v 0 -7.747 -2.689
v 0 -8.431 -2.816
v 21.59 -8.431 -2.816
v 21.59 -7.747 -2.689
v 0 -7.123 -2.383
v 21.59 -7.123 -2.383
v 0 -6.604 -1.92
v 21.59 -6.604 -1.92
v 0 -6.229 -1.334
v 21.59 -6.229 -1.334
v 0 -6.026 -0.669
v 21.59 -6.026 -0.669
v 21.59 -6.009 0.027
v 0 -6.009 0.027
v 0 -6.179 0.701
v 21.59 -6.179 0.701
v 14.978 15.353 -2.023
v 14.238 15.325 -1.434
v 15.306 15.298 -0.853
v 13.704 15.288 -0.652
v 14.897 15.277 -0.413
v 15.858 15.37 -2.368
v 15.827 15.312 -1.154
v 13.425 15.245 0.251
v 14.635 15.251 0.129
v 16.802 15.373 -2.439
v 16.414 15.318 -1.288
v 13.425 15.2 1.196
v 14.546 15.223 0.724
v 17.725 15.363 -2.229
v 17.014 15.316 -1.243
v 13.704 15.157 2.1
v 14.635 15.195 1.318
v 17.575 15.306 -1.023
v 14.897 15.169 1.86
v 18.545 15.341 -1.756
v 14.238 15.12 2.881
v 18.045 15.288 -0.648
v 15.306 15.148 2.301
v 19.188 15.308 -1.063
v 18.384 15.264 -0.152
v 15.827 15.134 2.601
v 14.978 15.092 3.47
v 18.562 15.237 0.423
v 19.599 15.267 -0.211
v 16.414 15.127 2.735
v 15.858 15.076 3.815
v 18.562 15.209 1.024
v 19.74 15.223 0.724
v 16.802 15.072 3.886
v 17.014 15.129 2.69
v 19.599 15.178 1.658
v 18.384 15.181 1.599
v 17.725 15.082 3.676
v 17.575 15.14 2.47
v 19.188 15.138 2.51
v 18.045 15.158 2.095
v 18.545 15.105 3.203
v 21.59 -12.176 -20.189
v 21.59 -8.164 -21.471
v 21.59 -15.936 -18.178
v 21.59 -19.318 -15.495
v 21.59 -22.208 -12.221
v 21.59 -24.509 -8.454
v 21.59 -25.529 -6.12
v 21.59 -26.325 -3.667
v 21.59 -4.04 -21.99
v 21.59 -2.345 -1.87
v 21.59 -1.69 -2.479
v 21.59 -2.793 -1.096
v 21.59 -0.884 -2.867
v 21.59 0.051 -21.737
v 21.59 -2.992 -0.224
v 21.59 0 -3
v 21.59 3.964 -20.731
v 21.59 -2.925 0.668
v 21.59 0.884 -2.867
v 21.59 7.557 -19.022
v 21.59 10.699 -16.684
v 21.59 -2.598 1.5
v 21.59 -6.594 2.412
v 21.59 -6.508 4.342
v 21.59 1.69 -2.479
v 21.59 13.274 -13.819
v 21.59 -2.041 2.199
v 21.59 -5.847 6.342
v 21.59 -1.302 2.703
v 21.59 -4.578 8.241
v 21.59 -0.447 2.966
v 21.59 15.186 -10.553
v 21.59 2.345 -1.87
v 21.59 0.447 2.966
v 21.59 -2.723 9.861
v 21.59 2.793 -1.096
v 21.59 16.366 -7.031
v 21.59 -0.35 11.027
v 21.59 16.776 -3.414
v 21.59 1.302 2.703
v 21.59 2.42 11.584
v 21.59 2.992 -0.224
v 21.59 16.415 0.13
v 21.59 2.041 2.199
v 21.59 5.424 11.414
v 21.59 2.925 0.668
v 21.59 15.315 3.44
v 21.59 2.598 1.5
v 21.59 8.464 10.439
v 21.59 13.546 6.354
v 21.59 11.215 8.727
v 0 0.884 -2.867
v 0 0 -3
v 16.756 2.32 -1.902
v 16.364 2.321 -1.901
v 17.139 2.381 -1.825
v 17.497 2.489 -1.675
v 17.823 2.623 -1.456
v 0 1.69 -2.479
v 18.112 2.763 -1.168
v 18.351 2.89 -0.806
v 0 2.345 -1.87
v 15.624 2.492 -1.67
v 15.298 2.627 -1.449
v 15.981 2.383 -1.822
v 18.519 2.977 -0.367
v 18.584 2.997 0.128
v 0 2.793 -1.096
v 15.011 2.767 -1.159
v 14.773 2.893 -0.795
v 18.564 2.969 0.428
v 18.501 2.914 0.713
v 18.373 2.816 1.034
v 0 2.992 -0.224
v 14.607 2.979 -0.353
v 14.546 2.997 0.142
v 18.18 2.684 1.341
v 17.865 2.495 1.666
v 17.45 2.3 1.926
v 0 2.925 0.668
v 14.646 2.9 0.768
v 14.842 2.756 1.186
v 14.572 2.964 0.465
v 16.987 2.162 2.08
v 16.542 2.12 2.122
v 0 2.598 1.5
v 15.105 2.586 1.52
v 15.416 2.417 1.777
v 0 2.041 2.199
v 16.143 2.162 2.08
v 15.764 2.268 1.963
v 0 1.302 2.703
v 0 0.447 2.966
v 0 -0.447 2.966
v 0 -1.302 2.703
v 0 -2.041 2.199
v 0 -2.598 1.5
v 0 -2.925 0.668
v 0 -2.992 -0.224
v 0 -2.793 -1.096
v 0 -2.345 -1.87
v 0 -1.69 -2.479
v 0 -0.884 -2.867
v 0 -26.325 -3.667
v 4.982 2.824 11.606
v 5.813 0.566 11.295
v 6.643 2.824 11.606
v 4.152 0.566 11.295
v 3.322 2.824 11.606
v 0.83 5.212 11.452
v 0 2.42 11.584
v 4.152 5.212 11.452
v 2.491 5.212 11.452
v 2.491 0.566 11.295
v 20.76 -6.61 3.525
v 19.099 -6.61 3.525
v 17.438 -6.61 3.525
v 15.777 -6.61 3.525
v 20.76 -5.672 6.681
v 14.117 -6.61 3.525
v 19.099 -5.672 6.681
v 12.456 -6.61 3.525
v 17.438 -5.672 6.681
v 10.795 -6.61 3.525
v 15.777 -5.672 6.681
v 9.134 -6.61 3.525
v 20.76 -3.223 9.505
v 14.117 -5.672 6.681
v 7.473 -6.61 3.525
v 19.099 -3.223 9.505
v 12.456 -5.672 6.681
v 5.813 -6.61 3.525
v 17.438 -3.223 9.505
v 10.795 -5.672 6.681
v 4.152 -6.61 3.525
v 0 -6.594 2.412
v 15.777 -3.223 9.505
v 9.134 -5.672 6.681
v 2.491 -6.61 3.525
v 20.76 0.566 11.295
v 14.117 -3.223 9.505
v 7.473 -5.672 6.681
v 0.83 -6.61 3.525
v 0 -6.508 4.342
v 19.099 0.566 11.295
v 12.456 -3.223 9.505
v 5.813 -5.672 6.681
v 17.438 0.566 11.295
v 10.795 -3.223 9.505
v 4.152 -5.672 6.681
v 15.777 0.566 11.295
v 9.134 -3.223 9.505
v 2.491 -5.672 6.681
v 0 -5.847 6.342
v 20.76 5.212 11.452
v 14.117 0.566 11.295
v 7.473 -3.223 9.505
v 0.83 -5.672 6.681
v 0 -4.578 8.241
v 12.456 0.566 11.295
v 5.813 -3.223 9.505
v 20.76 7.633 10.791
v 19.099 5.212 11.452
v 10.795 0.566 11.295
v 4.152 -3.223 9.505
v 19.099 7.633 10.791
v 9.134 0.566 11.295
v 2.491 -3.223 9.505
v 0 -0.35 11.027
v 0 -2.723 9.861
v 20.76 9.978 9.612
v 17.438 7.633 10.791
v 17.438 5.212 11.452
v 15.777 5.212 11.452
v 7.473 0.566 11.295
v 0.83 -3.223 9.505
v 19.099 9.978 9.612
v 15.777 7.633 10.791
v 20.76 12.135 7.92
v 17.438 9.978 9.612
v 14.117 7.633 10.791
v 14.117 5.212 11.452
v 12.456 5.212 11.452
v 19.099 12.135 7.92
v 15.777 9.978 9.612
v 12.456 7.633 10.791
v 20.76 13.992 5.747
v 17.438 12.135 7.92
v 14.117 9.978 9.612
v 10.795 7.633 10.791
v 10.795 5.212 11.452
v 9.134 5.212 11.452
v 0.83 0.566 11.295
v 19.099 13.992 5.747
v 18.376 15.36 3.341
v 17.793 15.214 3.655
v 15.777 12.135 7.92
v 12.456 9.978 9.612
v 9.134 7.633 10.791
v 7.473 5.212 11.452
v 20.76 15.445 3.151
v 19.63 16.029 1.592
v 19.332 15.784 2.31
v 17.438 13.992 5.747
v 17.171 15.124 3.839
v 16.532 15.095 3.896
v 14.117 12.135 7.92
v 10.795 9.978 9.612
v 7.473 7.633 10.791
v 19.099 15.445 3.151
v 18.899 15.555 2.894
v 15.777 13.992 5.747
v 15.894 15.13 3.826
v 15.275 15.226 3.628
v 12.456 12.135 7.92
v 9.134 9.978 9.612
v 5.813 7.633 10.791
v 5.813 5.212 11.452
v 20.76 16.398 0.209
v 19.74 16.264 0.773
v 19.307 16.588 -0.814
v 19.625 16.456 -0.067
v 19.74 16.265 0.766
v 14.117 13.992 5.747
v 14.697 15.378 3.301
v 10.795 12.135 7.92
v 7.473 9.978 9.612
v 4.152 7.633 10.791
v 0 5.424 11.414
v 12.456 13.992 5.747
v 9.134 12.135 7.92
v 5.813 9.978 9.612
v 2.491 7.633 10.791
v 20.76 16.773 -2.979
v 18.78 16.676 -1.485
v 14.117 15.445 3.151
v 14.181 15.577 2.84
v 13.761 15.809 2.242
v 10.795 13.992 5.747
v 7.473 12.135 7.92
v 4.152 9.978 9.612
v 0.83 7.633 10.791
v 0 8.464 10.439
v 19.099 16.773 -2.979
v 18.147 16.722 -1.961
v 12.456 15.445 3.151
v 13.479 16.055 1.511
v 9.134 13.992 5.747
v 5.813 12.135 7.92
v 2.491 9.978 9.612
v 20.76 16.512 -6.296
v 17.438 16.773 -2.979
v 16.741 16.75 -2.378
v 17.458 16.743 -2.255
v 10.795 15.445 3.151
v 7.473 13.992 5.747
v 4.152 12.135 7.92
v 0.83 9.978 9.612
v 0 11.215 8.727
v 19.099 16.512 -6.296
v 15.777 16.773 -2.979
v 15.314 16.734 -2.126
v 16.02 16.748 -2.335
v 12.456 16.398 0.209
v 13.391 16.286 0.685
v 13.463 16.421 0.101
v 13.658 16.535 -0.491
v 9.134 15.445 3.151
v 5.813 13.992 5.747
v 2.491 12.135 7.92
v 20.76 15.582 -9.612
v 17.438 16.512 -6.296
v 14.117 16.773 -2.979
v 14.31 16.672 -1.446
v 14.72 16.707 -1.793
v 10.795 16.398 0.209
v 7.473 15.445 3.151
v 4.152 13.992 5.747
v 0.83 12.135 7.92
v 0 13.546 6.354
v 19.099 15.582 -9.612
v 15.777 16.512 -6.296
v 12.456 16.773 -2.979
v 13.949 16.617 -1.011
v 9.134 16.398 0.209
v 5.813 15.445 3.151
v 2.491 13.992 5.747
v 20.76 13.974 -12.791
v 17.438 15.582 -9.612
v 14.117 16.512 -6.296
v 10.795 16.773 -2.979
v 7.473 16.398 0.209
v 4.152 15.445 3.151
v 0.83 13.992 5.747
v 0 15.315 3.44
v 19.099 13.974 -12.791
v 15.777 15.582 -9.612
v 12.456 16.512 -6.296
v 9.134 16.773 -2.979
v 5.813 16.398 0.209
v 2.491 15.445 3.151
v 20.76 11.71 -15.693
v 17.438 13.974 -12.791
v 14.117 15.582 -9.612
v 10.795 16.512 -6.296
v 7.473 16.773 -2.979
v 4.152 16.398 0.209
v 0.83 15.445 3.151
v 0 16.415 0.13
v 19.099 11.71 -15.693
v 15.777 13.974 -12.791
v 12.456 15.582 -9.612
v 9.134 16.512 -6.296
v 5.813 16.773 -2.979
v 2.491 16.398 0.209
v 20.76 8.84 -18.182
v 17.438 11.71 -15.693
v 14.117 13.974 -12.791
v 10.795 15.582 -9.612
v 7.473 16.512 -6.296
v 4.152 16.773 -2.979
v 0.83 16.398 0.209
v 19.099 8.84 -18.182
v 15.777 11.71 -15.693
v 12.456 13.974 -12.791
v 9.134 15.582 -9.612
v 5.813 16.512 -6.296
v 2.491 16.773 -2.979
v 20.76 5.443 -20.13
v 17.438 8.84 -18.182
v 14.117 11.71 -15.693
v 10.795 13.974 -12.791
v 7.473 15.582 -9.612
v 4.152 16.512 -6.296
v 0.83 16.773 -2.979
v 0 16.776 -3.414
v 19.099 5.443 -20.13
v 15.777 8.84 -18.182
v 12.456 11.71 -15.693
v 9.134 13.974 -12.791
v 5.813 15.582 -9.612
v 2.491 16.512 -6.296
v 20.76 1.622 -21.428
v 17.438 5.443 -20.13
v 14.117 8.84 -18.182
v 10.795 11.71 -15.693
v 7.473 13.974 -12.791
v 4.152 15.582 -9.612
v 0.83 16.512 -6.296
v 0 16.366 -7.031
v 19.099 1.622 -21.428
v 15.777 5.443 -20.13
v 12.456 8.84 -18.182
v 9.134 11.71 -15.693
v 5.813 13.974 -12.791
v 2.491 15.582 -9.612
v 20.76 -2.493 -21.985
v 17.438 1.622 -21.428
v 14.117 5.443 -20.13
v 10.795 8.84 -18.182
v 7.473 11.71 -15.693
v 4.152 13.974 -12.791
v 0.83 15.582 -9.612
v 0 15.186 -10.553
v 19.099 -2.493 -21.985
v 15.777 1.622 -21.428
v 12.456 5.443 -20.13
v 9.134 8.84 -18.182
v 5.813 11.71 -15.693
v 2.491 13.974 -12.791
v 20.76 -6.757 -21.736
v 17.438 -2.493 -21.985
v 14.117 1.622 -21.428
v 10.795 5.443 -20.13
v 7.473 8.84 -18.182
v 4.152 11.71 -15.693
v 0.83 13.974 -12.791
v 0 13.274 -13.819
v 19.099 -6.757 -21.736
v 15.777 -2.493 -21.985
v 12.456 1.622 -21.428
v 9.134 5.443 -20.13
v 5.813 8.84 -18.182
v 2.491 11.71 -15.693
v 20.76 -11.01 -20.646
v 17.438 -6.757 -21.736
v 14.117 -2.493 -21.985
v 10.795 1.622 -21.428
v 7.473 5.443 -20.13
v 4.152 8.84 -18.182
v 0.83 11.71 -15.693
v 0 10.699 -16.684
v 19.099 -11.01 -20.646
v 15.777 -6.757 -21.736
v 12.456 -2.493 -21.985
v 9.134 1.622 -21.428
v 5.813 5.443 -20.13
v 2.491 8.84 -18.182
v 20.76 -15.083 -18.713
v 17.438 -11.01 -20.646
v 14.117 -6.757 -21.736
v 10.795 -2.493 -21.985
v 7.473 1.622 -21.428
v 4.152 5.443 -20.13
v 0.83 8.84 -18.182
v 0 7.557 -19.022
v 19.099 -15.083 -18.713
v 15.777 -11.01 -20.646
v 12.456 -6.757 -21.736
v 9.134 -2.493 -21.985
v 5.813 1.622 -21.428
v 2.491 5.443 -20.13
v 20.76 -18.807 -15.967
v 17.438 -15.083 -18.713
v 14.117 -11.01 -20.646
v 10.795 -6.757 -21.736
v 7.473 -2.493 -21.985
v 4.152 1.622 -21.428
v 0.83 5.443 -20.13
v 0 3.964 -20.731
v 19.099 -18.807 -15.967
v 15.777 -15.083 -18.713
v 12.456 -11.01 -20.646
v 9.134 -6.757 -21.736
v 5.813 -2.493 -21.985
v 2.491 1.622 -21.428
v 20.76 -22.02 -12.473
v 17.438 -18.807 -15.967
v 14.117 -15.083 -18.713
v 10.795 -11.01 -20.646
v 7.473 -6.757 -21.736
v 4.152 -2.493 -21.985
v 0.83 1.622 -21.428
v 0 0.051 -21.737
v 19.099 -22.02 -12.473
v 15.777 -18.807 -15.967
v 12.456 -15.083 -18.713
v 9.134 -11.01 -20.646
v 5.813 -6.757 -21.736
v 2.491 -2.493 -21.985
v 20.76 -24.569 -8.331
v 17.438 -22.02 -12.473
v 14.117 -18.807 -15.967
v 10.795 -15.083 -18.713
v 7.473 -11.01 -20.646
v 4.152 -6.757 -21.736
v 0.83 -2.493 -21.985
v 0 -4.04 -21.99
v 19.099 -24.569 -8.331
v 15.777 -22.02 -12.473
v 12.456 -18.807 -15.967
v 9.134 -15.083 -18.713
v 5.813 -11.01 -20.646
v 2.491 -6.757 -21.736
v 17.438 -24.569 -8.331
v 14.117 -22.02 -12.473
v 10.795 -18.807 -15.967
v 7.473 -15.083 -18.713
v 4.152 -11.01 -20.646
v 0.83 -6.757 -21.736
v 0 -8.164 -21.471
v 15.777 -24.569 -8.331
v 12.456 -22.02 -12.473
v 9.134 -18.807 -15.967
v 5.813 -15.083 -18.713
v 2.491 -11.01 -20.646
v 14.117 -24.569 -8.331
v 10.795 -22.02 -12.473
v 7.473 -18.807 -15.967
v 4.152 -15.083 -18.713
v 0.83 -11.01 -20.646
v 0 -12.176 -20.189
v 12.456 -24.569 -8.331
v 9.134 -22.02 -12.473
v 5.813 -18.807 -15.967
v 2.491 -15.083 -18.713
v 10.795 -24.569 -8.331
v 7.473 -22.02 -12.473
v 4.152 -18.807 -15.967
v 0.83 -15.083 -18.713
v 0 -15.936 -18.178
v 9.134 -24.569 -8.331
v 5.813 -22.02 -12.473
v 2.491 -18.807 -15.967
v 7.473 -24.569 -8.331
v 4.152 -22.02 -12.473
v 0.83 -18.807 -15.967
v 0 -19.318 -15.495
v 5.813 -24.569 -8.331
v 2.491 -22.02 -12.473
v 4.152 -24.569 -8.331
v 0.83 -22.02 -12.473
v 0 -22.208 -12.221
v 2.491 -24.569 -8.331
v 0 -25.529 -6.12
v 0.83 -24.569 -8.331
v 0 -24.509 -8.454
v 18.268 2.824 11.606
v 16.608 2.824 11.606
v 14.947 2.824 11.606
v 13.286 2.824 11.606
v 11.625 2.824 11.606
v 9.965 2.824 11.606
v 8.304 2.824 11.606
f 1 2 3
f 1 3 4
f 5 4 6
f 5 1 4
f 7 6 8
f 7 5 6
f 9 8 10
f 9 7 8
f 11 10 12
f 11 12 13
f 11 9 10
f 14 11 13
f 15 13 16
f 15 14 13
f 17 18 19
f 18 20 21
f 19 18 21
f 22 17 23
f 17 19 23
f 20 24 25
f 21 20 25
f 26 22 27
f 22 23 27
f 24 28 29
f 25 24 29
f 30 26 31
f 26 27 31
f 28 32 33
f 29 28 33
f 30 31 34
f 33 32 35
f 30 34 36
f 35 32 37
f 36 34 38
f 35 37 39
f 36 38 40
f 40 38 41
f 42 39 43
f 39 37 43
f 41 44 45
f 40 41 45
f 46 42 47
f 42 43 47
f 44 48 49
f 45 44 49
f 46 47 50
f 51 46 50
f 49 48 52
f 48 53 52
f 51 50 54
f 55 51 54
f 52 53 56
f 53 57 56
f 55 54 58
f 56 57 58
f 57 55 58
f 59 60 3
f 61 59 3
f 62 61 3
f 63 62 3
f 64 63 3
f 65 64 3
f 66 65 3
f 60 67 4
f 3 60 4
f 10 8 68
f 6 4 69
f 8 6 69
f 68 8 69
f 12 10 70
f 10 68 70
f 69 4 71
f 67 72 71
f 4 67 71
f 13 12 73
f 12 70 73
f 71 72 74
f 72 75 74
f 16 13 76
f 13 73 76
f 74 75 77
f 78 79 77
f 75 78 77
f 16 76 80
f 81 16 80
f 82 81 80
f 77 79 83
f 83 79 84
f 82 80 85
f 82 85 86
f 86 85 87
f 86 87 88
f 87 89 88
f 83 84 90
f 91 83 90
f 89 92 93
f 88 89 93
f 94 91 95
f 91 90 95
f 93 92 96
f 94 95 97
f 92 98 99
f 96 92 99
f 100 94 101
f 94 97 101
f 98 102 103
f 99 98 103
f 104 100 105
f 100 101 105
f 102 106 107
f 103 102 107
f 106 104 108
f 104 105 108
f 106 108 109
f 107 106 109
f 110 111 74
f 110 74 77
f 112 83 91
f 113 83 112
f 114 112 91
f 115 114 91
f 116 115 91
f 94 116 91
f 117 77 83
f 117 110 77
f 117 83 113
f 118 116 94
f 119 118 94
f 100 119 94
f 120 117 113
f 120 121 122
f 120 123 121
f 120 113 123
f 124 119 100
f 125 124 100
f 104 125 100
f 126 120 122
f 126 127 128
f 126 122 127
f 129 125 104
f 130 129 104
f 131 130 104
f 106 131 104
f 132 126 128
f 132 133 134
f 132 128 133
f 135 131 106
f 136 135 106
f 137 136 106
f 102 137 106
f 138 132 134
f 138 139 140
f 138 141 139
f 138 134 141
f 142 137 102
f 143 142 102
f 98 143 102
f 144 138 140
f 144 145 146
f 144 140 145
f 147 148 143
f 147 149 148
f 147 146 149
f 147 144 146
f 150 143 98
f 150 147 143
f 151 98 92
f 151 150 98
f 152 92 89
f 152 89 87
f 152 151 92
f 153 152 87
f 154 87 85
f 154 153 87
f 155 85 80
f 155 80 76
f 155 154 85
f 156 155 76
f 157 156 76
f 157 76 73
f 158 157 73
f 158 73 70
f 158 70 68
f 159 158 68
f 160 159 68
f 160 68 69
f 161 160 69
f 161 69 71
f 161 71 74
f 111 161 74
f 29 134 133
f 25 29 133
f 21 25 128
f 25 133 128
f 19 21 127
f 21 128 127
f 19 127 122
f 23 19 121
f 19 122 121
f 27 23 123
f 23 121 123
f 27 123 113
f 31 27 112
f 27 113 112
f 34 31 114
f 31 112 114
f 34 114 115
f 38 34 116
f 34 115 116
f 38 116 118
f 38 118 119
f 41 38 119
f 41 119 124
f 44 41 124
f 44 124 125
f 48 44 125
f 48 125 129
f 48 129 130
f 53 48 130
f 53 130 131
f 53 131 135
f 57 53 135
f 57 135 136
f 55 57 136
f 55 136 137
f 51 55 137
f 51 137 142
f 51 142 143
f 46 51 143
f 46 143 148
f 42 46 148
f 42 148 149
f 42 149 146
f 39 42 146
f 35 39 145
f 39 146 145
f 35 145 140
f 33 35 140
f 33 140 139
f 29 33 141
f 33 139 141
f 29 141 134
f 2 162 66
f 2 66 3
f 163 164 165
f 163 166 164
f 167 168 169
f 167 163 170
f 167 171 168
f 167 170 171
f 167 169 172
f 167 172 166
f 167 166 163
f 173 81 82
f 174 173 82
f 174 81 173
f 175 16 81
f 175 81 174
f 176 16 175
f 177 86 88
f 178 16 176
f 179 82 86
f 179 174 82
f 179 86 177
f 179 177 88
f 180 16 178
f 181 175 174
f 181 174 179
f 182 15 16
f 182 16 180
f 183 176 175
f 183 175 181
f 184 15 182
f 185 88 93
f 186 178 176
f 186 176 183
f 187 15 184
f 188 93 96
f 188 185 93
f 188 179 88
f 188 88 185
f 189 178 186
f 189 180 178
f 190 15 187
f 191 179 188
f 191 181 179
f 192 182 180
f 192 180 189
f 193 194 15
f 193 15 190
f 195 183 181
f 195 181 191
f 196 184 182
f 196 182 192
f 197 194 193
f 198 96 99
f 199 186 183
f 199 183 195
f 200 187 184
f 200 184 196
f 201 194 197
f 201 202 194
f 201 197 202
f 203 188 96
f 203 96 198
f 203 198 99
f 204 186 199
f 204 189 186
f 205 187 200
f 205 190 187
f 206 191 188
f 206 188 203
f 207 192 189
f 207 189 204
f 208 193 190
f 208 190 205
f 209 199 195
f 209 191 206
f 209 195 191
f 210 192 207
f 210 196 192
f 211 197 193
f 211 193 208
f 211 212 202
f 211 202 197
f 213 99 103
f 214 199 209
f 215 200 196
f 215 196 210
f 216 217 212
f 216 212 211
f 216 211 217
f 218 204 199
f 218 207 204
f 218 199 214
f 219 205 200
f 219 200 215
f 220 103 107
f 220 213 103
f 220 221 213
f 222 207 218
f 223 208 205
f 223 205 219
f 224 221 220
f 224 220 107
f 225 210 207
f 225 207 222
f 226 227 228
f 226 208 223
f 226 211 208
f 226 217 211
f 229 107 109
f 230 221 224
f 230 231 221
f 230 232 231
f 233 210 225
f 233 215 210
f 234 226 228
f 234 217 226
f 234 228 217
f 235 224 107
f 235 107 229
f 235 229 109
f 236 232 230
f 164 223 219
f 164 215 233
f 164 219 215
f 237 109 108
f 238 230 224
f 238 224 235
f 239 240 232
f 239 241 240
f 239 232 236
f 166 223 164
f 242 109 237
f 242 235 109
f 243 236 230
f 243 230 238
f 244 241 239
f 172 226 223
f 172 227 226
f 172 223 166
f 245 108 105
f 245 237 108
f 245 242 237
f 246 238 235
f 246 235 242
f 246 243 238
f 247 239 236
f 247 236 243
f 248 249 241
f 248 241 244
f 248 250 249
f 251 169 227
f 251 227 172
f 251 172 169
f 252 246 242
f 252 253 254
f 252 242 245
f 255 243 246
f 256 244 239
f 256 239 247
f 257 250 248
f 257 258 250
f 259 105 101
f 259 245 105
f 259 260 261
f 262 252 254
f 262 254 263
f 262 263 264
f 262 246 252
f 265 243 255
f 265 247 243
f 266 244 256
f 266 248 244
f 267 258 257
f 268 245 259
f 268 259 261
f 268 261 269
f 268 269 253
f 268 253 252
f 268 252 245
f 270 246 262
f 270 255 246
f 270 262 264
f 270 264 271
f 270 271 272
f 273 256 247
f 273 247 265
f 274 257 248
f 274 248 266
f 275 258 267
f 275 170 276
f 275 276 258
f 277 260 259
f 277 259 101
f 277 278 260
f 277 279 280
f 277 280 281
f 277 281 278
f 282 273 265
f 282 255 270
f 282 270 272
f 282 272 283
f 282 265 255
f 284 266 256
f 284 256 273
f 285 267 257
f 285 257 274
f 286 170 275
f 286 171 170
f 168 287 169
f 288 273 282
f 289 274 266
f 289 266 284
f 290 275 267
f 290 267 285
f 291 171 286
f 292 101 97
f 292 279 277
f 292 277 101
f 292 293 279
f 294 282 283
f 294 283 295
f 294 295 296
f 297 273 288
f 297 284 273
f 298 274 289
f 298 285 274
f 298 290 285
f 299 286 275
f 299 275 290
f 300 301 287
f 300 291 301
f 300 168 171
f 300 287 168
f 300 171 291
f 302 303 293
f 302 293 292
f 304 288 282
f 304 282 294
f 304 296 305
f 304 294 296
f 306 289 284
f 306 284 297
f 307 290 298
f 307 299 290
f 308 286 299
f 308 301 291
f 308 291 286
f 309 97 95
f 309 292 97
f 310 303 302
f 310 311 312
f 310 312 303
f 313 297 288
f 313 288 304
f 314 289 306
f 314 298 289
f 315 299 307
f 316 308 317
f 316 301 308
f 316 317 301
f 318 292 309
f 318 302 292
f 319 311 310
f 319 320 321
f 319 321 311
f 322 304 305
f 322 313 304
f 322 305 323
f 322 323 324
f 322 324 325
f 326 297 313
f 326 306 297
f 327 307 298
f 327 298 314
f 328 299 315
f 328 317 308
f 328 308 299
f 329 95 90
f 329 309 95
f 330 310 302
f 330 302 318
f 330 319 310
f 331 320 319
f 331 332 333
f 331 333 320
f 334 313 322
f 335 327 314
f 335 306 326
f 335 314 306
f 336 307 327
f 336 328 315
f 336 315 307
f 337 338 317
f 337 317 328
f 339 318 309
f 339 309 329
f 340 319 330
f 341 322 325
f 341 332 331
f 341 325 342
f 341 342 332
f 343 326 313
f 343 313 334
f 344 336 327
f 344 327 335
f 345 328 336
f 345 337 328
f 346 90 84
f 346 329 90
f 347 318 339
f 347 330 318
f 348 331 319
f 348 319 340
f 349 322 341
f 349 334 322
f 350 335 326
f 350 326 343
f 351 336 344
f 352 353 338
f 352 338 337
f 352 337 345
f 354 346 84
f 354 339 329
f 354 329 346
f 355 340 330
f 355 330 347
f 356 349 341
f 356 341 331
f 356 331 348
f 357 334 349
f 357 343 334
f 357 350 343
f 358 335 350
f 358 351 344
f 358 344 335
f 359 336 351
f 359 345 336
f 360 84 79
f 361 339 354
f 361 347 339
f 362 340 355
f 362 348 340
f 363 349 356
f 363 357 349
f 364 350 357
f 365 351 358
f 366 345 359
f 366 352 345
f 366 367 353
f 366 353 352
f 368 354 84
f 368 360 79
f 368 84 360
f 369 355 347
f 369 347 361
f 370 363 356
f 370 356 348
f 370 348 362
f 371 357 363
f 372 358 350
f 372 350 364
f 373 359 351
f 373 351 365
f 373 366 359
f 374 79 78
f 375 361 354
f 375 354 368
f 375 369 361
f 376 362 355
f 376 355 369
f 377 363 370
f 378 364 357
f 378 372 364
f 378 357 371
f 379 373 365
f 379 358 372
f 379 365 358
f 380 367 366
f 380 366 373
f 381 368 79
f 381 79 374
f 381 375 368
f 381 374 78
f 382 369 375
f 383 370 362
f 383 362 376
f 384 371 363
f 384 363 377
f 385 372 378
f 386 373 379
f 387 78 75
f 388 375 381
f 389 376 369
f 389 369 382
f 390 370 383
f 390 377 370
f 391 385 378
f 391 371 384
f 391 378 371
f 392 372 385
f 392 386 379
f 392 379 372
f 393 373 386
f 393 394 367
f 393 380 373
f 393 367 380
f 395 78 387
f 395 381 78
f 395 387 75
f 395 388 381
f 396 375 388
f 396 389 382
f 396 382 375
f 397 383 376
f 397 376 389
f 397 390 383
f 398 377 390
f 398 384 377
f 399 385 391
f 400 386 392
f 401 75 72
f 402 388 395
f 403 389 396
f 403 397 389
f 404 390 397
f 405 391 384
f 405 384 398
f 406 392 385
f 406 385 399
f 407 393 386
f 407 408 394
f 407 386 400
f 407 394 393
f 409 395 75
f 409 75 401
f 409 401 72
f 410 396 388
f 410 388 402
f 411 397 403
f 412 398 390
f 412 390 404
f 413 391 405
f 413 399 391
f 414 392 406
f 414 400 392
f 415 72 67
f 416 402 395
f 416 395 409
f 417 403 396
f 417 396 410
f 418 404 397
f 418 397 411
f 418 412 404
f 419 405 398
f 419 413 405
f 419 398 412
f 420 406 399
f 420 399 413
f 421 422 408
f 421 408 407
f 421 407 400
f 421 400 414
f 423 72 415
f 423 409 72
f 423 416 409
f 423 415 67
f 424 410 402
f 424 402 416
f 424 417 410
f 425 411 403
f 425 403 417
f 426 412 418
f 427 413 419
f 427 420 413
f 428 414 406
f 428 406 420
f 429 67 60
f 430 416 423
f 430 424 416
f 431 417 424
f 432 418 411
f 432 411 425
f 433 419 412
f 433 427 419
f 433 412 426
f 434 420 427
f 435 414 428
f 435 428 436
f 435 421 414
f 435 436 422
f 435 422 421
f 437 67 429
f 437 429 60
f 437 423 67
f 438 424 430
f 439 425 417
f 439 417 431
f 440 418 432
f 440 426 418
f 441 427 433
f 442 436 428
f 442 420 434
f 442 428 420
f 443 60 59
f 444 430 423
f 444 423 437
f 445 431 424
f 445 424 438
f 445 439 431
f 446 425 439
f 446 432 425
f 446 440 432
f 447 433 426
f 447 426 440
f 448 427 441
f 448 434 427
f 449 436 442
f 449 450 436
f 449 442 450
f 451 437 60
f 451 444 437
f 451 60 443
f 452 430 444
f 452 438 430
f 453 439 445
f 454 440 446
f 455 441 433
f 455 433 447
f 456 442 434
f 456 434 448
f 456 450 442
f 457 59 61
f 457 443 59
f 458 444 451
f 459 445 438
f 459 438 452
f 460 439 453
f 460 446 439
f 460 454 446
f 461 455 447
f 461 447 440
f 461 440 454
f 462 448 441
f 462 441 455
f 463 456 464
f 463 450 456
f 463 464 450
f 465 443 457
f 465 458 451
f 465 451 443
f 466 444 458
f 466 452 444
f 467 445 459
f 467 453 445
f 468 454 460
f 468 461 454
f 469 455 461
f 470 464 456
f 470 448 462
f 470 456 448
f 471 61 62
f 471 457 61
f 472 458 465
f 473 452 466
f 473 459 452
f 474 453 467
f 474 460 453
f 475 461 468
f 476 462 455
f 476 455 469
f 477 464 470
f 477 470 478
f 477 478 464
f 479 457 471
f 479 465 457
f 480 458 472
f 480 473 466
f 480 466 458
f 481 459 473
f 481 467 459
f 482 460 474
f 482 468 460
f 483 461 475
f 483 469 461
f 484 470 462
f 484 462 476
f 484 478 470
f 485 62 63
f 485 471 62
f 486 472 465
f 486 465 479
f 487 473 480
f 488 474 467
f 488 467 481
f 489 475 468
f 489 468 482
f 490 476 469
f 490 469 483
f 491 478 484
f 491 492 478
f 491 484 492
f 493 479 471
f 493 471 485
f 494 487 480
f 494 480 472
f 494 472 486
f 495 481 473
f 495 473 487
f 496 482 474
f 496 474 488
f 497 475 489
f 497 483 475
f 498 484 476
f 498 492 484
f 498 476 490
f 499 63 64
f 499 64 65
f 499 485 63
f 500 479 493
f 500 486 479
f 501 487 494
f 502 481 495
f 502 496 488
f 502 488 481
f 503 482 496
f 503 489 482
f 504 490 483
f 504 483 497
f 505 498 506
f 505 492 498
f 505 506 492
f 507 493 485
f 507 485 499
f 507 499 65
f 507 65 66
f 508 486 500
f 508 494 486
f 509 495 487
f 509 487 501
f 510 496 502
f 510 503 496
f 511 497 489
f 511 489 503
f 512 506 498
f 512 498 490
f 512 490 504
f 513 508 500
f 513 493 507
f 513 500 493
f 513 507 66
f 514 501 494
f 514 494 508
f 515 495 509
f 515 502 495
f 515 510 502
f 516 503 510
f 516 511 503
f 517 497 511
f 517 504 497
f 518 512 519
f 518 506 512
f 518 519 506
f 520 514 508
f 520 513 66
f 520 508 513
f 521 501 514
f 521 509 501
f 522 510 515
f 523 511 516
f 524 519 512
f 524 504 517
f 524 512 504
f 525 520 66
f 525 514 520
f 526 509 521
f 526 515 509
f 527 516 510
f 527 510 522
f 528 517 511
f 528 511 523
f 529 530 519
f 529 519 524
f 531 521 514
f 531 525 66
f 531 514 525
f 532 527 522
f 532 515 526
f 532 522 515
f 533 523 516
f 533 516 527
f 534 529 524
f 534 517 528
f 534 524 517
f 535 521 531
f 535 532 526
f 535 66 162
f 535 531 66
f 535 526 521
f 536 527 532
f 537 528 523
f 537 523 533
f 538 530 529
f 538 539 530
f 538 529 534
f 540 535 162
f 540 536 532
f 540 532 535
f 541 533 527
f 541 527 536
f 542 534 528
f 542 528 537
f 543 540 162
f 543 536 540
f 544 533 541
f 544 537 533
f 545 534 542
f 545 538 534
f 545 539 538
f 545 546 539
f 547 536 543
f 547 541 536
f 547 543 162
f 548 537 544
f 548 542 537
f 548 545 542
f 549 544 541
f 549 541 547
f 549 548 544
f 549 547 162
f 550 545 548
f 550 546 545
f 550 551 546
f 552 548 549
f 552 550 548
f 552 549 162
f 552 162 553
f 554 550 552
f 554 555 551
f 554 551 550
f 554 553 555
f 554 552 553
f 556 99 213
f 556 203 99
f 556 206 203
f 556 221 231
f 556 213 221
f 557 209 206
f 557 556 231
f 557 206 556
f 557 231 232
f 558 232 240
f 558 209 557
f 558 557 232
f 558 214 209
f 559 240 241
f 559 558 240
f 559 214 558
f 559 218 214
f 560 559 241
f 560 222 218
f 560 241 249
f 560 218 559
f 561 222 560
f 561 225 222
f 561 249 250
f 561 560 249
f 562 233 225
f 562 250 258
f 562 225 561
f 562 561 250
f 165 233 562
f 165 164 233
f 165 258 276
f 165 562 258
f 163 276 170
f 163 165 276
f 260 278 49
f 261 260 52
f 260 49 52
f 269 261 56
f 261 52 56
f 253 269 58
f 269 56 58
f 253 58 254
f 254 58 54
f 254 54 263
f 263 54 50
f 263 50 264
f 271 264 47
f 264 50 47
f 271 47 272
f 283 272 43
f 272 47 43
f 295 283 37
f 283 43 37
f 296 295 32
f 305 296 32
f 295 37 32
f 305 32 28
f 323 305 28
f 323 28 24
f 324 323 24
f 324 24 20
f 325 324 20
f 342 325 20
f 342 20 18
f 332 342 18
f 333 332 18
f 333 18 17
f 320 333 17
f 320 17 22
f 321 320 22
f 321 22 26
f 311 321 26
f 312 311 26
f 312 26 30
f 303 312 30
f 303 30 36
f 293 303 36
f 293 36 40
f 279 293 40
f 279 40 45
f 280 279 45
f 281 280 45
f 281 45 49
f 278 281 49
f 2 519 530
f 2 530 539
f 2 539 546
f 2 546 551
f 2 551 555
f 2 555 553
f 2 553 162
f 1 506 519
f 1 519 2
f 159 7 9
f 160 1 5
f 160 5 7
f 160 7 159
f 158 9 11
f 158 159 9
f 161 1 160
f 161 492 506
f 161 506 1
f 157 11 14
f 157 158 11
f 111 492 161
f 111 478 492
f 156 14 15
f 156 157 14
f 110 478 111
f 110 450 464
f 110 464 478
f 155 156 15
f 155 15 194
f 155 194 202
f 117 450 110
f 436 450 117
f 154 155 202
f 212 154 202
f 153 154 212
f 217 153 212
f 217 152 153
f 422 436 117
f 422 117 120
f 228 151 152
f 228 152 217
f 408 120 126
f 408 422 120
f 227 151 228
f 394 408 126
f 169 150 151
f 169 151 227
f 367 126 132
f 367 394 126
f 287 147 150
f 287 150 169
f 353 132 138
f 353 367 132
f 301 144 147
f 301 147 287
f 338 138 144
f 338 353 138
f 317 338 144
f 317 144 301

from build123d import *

# Parameters (mm, degrees)
SKETCH4_R                  = 3
BOSS_EXTRUDE1_DEPTH        = 21.59
CUT_EXTRUDE1_START         = -15.24
SKETCH8_R                  = 3.175
CUT_EXTRUDE1_DEPTH         = 5.08
F_10_32_TAPPED_HOLE1_D     = 4.0386
F_10_32_TAPPED_HOLE1_DEPTH = 13.8176
F_10_32_TAPPED_HOLE1_TIP   = 1.213317848


with BuildPart() as part:
    # Sketch4 → Boss-Extrude1 (new body)
    with BuildSketch(Plane(origin=(0, 0, 0), x_dir=(0, 0, -1), z_dir=(1, 0, 0))):
        with BuildLine():
            Line((3.667013126, -26.3254835), (2.816473307, -8.431236894))
            ThreePointArc((2.816473307, -8.431236894), (1.639602622, -6.396649217), (-0.700777066, -6.179406175))
            add(Edge.make_bspline(
                [(-0.700777066, -6.179406175), (-1.525102008, -6.512822326), (-2.494871997, -6.679047096), (-4.555429578, -6.54165034), (-5.644996058, -6.237076936), (-7.717261628, -5.106975392), (-8.698405735, -4.281093265), (-10.311829803, -2.164612563), (-10.942499326, -0.874358563), (-11.647480976, 2.006859472), (-11.720427957, 3.596803483), (-11.182779689, 6.826310345), (-10.571334953, 8.46432492), (-9.132019695, 10.73433891), (-8.566197708, 11.459621106), (-7.273120414, 12.810057002), (-6.545872807, 13.435152517), (-4.948692799, 14.549748502), (-4.078780417, 15.039192621), (-2.22269385, 15.85074605), (-1.236551533, 16.172803424), (0.818678144, 16.623204755), (1.887722789, 16.751503646), (4.069669804, 16.79483508), (5.182520117, 16.709831654), (7.408648574, 16.315055224), (8.521867273, 16.00525724), (10.70264063, 15.158359498), (11.770130786, 14.621247223), (13.812561896, 13.326727542), (14.787435905, 12.56932106), (16.598938448, 10.850935673), (17.435500393, 9.889971566), (18.927885533, 7.790674993), (19.583645356, 6.652371052), (20.677096627, 4.233429246), (21.114730733, 2.952832896), (21.741586229, 0.292117033), (21.930758945, -1.087949282), (22.038932986, -3.898444365), (21.957896657, -5.328810088), (21.513783431, -8.186144708), (21.150681858, -9.613043017), (20.141400668, -12.407098951), (19.49521083, -13.774181132), (17.930076055, -16.391877744), (17.011136269, -17.642414844), (14.922264044, -19.972214517), (13.752352434, -21.051401006), (11.194349378, -22.98792657), (9.80629411, -23.845193985), (6.855009859, -25.29377098), (5.291831431, -25.88501641), (3.667013126, -26.3254835)],
                knots=[0, 0, 0, 0, 0.0625, 0.0625, 0.125, 0.125, 0.1875, 0.1875, 0.25, 0.25, 0.3125, 0.3125, 0.375, 0.375, 0.40625, 0.40625, 0.4375, 0.4375, 0.46875, 0.46875, 0.5, 0.5, 0.53125, 0.53125, 0.5625, 0.5625, 0.59375, 0.59375, 0.625, 0.625, 0.65625, 0.65625, 0.6875, 0.6875, 0.71875, 0.71875, 0.75, 0.75, 0.78125, 0.78125, 0.8125, 0.8125, 0.84375, 0.84375, 0.875, 0.875, 0.90625, 0.90625, 0.9375, 0.9375, 0.96875, 0.96875, 1, 1, 1, 1], degree=3))
        make_face()
        Circle(SKETCH4_R, mode=Mode.SUBTRACT)
    extrude(amount=BOSS_EXTRUDE1_DEPTH)

    # Sketch8 → Cut-Extrude1 (cut)
    with BuildSketch(Plane(origin=(0, 0, 0), x_dir=(1, 0, 0), z_dir=(0, -0.9988722902167577, -0.04747786681317337)).offset(CUT_EXTRUDE1_START)):
        with Locations((16.565, 0)):
            Circle(SKETCH8_R)
    extrude(amount=-CUT_EXTRUDE1_DEPTH, mode=Mode.SUBTRACT)

    # #10-32 Tapped Hole1
    with Locations(Plane(origin=(0, 15.222813703, 0.72356269), x_dir=(1, 0, 0), z_dir=(0, 0.9988722902167577, 0.04747786681317337))):
        with Locations((16.565, 0)):
            Hole(F_10_32_TAPPED_HOLE1_D / 2, depth=F_10_32_TAPPED_HOLE1_DEPTH)
            with Locations((0, 0, -(F_10_32_TAPPED_HOLE1_DEPTH + F_10_32_TAPPED_HOLE1_TIP / 2))):  # 118° drill point
                Cone(0, F_10_32_TAPPED_HOLE1_D / 2, F_10_32_TAPPED_HOLE1_TIP, mode=Mode.SUBTRACT)


solid = part.part
